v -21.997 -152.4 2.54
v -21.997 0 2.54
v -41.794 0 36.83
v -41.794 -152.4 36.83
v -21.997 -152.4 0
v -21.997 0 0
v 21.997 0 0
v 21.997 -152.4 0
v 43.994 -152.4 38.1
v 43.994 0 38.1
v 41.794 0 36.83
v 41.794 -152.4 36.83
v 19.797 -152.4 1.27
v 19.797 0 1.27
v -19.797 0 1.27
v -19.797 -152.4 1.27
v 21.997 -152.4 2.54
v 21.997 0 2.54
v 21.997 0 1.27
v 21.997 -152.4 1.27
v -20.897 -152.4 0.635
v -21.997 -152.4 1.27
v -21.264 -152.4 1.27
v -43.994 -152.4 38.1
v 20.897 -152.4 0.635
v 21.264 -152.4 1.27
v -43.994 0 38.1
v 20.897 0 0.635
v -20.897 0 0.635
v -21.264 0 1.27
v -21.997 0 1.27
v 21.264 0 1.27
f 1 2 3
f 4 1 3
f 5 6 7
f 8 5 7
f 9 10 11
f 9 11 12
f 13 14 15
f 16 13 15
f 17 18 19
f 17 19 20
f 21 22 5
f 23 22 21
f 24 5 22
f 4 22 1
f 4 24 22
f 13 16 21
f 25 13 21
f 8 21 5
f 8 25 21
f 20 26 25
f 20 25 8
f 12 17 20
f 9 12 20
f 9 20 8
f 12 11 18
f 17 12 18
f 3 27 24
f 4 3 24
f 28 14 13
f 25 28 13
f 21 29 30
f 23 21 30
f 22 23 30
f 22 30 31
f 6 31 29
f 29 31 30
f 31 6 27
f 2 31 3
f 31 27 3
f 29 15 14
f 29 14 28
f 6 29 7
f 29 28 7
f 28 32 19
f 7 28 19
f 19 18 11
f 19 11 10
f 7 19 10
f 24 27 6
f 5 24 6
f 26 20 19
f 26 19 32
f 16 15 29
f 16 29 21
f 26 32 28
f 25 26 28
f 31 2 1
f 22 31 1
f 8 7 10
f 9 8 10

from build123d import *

# Parameters (mm, degrees)
F1_DEPTH = 152.4
F2_DEPTH = 74.93
F3_DEPTH = 74.93
F4_DEPTH = 74.93


with BuildPart() as f1:
    # F0 (on Front) → F1 (new body)
    with BuildSketch(Plane.XZ):
        Polygon((43.9940905122, 38.1), (21.9970452561, 76.2), (-21.9970452561, 76.2), (-43.9940905122, 38.1), (-21.9970452561, 0), (21.9970452561, 0), align=None)
    extrude(amount=F1_DEPTH)

    # F2 (cut): a face of the model
    f2_faces = [f1.faces().sort_by_distance(p)[0] for p in [
        (32.9955678842, -76.2, 57.15),
    ]]
    extrude(f2_faces, amount=-F2_DEPTH, mode=Mode.SUBTRACT)

    # F3 (cut): a face of the model
    f3_faces = [f1.faces().sort_by_distance(p)[0] for p in [
        (0, -76.2, 76.2),
    ]]
    extrude(f3_faces, amount=-F3_DEPTH, mode=Mode.SUBTRACT)

    # F4 (cut): a face of the model
    f4_faces = [f1.faces().sort_by_distance(p)[0] for p in [
        (-32.9955678842, -76.2, 57.15),
    ]]
    extrude(f4_faces, amount=-F4_DEPTH, mode=Mode.SUBTRACT)


solid = f1.part
